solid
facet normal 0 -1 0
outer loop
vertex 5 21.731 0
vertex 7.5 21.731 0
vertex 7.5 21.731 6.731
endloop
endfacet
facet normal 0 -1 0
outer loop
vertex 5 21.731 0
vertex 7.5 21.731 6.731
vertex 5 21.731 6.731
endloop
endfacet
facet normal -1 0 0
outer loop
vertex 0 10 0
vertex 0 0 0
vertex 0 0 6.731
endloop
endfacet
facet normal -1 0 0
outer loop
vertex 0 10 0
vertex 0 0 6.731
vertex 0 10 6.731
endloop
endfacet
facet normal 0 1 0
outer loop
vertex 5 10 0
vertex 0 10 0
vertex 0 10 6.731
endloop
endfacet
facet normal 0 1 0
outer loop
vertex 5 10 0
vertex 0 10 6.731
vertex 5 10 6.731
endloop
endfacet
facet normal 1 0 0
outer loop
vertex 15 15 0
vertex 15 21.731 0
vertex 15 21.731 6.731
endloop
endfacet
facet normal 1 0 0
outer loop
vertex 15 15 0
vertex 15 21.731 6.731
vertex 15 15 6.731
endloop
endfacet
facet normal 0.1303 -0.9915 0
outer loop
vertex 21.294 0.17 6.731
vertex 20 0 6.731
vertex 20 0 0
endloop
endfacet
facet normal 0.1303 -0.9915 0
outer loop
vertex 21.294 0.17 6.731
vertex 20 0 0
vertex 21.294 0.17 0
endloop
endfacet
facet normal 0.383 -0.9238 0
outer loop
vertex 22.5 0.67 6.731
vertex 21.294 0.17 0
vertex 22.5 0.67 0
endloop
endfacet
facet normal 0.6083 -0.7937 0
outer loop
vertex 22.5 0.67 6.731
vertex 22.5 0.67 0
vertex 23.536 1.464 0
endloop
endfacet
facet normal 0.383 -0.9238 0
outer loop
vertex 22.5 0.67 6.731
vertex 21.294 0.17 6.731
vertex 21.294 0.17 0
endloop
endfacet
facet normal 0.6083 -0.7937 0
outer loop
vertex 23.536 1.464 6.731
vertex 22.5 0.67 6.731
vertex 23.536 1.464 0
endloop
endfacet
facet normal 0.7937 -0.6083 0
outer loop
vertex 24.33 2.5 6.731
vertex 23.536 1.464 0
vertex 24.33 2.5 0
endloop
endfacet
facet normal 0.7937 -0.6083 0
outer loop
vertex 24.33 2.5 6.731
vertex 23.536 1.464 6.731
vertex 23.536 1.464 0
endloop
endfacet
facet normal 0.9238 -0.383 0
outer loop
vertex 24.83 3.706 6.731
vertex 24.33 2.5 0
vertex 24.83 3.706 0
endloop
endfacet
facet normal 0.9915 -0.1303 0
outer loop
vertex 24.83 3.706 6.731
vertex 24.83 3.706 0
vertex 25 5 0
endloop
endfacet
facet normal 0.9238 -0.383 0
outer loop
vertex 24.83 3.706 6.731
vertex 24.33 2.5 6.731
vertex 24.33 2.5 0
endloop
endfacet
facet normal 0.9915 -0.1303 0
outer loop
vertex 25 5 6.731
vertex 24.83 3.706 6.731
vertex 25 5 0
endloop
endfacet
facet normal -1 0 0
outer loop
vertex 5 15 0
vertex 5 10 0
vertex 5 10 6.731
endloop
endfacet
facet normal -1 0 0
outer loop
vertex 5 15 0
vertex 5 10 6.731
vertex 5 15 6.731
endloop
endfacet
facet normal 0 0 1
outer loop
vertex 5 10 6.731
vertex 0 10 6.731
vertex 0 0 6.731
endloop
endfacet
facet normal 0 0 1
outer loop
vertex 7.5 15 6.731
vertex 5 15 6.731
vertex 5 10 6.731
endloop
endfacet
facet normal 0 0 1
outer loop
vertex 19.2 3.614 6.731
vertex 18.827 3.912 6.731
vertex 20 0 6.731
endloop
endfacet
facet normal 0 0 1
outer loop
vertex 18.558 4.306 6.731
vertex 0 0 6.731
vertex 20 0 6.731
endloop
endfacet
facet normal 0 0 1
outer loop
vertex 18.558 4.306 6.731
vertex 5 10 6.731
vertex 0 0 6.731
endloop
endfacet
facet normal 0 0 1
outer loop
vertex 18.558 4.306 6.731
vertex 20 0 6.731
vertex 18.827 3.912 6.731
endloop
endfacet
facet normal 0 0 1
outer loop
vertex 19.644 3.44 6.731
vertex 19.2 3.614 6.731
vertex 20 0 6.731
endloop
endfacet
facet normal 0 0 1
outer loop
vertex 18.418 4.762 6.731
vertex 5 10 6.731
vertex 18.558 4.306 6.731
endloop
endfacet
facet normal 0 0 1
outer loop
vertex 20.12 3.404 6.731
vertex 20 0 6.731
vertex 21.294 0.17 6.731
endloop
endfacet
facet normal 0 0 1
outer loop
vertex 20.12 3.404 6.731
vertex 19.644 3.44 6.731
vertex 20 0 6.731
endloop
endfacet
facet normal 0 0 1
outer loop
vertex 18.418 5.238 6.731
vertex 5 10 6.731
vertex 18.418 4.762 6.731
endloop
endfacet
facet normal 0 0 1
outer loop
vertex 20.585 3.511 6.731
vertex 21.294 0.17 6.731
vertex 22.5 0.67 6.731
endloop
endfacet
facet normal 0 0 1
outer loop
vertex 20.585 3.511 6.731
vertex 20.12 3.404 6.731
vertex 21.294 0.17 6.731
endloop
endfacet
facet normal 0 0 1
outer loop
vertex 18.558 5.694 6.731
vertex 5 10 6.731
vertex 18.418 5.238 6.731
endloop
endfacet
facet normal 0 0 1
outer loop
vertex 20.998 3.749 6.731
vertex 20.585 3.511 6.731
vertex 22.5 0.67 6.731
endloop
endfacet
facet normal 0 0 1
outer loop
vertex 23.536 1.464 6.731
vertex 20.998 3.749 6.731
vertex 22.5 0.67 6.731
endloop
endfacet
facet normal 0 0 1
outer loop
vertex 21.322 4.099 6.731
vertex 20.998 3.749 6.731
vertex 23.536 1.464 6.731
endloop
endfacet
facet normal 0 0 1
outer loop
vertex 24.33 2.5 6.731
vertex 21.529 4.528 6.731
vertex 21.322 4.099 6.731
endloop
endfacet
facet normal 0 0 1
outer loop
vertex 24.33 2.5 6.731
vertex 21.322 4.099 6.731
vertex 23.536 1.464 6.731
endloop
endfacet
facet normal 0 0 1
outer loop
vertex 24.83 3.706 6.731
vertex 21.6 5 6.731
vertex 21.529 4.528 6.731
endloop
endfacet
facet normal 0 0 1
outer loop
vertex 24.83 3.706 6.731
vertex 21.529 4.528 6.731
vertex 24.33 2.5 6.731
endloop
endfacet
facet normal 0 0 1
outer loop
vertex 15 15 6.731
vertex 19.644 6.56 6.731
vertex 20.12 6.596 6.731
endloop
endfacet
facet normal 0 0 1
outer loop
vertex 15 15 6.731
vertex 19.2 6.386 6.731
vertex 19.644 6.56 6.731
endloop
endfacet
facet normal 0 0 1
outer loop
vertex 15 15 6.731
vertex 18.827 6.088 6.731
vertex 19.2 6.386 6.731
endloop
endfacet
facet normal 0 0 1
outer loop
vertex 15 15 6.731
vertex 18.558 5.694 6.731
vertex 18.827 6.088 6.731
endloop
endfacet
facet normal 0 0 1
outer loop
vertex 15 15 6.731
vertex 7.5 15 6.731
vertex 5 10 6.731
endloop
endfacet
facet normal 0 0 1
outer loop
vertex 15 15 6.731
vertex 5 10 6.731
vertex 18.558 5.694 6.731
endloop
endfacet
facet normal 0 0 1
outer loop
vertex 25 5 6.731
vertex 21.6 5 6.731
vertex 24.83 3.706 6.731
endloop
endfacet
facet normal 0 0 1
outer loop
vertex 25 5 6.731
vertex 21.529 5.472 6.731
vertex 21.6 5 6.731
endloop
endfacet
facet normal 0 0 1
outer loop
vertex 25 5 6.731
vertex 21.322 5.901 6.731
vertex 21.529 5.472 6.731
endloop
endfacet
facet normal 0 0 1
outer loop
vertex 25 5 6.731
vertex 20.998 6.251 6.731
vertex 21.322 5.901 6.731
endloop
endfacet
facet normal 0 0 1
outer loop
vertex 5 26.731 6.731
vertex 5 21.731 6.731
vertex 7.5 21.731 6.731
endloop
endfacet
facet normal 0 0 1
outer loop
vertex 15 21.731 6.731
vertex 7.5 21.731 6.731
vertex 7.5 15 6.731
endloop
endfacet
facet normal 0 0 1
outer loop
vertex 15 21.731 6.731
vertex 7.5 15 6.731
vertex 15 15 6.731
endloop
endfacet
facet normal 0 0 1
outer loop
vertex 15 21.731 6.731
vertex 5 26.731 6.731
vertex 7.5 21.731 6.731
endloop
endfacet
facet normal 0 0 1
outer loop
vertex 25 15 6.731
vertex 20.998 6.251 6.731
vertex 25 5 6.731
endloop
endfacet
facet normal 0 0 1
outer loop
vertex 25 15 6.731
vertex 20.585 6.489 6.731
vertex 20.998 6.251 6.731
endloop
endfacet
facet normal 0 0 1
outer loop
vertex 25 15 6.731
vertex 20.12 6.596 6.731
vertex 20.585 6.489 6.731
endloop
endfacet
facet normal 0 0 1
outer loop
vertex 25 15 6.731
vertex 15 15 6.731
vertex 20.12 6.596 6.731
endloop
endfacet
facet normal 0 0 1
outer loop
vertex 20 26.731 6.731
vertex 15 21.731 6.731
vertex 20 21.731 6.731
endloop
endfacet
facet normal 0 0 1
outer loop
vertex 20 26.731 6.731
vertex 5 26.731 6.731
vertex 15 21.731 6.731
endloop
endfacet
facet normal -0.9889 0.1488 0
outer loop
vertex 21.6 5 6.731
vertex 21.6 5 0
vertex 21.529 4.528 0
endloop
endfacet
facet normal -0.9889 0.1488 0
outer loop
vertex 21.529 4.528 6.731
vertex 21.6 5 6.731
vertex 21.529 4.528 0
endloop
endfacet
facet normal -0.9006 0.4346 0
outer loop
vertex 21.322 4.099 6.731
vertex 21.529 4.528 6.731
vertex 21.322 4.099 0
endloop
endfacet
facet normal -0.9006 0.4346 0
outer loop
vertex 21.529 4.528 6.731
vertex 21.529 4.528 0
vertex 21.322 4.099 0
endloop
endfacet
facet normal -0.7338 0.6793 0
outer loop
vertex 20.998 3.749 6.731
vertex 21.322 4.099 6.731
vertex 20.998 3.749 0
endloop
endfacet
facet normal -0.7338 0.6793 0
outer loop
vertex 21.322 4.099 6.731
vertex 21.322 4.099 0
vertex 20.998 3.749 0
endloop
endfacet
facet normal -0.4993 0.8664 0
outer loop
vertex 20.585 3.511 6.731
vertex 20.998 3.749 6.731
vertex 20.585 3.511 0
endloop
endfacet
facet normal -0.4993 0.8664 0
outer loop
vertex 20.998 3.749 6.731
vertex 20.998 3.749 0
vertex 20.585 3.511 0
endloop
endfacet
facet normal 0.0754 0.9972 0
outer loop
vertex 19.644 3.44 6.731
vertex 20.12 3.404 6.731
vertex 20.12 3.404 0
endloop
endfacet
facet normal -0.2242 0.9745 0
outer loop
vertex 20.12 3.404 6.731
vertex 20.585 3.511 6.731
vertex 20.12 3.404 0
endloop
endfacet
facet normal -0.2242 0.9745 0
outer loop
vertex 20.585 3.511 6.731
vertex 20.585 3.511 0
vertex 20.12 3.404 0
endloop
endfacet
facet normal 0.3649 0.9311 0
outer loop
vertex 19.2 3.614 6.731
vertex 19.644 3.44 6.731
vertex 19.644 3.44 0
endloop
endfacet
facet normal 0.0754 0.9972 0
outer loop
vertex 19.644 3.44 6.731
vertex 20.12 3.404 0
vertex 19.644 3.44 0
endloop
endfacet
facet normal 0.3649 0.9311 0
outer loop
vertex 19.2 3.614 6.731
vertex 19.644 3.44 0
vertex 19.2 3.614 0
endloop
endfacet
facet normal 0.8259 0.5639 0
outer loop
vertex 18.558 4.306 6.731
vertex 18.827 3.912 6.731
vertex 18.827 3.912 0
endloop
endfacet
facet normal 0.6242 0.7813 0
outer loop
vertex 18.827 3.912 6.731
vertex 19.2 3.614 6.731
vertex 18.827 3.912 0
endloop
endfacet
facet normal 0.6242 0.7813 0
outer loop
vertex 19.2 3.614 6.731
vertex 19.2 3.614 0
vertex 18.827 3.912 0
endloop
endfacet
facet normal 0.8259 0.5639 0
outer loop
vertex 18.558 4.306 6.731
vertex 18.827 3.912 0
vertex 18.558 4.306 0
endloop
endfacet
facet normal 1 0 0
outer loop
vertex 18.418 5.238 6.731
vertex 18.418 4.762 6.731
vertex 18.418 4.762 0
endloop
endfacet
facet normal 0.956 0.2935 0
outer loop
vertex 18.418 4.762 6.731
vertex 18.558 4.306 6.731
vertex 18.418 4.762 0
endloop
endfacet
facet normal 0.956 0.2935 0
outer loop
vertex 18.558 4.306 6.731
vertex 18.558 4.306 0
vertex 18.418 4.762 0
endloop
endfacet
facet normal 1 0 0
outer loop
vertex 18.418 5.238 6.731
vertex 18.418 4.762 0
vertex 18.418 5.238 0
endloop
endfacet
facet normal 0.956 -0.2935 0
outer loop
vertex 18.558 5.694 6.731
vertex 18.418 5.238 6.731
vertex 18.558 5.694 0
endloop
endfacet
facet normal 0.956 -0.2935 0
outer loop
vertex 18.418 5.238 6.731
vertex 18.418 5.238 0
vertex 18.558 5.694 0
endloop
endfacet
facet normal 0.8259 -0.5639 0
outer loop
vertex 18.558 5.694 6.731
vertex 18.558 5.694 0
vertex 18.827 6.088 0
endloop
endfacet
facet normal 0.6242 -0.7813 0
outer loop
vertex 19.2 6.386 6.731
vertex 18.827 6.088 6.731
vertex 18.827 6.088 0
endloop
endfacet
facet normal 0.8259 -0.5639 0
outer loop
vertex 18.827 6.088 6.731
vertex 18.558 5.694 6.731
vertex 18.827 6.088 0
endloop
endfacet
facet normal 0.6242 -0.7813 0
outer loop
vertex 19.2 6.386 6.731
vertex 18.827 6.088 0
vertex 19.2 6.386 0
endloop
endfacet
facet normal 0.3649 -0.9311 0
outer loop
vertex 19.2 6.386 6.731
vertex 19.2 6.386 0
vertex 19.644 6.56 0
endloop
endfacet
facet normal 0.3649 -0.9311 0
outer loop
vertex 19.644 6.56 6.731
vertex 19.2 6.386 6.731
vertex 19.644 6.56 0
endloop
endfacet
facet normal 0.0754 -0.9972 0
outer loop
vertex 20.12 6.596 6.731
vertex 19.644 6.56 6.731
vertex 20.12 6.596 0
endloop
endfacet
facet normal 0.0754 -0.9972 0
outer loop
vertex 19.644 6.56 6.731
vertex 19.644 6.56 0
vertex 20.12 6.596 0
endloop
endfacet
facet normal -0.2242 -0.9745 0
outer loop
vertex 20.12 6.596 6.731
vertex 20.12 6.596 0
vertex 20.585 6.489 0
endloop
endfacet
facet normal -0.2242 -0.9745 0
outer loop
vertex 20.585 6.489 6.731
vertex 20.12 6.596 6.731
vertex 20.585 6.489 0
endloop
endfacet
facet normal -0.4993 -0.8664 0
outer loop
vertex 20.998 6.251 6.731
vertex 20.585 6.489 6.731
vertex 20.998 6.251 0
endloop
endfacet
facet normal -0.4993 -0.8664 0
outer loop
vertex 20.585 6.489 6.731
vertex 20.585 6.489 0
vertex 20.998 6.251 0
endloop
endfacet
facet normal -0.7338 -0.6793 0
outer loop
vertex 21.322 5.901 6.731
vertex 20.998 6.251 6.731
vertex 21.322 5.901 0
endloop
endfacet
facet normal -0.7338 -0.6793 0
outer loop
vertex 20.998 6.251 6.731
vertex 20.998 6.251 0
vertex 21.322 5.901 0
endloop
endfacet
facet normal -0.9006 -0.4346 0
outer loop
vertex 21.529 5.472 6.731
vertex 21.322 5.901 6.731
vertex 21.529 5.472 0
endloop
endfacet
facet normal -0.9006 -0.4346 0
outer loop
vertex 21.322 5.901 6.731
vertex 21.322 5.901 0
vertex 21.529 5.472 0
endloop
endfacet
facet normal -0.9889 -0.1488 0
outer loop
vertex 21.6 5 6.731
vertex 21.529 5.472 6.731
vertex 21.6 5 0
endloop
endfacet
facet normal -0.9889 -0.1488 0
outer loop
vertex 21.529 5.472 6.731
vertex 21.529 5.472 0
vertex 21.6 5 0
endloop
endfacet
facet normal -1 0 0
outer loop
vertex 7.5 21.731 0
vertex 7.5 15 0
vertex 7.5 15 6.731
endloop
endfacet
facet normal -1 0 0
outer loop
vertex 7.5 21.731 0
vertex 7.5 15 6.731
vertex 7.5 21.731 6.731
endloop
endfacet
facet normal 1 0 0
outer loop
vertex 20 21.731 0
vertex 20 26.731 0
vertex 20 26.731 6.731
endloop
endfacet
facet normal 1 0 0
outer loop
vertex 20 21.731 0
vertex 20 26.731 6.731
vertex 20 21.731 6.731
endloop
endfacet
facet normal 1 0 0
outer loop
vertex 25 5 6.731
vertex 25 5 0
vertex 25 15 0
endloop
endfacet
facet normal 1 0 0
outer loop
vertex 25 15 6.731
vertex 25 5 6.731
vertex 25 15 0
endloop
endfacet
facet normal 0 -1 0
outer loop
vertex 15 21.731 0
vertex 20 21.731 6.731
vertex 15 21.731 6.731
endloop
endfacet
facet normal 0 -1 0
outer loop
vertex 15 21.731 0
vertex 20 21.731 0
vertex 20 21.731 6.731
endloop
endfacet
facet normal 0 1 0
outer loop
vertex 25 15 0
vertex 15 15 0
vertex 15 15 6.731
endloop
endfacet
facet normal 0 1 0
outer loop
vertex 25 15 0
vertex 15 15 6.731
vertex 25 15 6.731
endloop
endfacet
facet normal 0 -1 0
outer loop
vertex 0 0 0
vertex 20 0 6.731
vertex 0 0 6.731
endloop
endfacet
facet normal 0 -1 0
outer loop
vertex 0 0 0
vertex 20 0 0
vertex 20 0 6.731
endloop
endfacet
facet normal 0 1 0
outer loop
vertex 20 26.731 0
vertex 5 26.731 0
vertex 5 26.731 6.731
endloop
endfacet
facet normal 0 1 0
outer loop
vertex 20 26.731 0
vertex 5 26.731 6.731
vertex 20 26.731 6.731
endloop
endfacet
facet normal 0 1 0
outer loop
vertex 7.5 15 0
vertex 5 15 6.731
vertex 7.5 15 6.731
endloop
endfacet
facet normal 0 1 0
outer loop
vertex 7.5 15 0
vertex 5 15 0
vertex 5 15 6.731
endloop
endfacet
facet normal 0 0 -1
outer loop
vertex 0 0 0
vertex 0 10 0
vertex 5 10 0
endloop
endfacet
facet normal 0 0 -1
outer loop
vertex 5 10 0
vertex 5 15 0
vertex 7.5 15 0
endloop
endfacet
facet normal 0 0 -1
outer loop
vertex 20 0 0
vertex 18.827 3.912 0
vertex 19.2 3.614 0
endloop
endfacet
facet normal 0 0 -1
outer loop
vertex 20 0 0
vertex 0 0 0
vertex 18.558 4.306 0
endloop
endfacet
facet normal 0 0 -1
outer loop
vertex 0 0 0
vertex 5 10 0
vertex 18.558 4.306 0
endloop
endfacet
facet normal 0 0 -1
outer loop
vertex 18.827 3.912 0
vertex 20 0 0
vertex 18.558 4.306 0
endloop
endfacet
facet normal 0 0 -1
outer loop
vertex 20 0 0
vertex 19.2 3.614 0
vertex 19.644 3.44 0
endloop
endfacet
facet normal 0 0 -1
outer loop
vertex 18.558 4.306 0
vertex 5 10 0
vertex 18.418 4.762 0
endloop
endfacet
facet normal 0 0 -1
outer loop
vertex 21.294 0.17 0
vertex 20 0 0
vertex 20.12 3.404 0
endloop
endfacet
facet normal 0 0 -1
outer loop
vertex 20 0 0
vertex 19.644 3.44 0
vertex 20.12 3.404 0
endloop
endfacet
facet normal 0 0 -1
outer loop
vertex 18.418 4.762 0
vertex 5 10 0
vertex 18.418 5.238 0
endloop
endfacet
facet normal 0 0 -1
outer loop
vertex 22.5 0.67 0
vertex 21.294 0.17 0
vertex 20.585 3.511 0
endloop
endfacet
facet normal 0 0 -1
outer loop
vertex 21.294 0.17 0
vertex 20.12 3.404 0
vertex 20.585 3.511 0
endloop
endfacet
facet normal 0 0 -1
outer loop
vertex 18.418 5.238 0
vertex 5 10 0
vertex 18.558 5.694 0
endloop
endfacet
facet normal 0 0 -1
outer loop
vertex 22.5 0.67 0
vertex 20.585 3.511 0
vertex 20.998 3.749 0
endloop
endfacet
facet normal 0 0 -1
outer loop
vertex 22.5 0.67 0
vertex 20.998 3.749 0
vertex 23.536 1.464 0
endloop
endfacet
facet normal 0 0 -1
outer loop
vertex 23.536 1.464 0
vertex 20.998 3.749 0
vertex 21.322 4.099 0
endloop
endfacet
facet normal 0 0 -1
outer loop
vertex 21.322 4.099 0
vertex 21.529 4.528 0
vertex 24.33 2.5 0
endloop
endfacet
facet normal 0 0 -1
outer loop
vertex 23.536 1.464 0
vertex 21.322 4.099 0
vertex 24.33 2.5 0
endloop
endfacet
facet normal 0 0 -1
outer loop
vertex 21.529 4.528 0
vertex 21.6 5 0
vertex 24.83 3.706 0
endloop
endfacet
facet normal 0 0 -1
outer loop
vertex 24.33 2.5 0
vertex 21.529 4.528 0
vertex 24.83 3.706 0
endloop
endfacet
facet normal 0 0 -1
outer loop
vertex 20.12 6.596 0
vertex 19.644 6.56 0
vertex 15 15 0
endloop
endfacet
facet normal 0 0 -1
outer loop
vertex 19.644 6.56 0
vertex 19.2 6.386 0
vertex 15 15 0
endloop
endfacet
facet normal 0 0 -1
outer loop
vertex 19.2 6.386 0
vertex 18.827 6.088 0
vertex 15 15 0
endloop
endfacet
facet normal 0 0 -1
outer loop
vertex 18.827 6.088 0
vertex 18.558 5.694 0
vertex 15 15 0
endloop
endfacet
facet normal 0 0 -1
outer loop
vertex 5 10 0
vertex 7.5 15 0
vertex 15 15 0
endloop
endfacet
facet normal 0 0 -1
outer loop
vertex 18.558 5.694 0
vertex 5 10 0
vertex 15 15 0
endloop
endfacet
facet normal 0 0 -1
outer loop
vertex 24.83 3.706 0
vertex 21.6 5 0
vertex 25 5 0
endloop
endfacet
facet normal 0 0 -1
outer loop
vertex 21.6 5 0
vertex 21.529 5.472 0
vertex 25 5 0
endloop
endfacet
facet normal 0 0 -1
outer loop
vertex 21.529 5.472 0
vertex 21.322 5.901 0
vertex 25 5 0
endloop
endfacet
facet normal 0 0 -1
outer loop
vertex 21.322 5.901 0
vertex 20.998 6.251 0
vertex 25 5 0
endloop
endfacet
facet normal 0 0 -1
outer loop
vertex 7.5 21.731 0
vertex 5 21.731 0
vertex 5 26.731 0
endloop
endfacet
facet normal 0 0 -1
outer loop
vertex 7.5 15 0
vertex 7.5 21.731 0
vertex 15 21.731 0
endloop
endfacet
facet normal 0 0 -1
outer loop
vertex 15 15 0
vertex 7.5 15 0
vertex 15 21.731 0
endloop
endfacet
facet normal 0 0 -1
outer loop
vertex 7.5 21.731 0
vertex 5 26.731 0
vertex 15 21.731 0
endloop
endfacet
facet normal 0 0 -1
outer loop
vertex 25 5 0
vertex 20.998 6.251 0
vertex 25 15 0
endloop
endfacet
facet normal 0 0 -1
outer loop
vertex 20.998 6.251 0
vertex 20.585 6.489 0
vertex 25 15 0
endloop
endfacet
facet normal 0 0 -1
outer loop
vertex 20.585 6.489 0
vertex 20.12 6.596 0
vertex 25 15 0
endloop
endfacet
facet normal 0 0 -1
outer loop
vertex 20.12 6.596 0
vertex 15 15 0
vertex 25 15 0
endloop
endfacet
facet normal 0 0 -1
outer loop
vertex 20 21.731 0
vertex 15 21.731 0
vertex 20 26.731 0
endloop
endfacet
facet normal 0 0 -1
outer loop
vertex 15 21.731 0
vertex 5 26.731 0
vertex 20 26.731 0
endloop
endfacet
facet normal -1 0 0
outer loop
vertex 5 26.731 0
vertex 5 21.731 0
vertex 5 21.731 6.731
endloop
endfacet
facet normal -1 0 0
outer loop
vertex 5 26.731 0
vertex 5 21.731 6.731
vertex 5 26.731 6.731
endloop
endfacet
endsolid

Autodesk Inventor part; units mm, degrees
ref_plane "YZ Plane" through (0, 0, 0) normal (1, 0, 0) x (0, 1, 0)
ref_plane "XZ Plane" through (0, 0, 0) normal (0, 1, 0) x (-1, 0, 0)
ref_plane "XY Plane" through (0, 0, 0) normal (0, 0, 1) x (1, 0, 0)
sketch "Sketch1" plane through (0, 0, 0) normal (0, 0, 1) x (1, 0, 0)
  line L0 (25, 0) -> (0, 0)
  line L1 (0, 0) -> (0, 10)
  line L2 (0, 10) -> (5, 10)
  line L3 (25, 0) -> (25, 15)
  circle A0 centre (20, 5) radius 1.6
  line L4 (5, 10) -> (5, 15)
  line L5 (7.5, 15) -> (7.5, 21.731)
  line L6 (7.5, 21.731) -> (5, 21.731)
  line L7 (5, 21.731) -> (5, 26.731)
  line L8 (5, 26.731) -> (20, 26.731)
  line L9 (20, 26.731) -> (20, 21.731)
  line L10 (20, 21.731) -> (15, 21.731)
  line L11 (15, 21.731) -> (15, 15)
  line L12 (5, 15) -> (7.5, 15)
  line L13 (15, 15) -> (25, 15)
  dimension "d0" = 10
  dimension "d8" = 5
  dimension "d9" = 25
  dimension "d12" = 5
  dimension "d13" = 5
  dimension "d20" = 3.2
  dimension "d22" = 7.5
  dimension "d23" = 2.5
  dimension "d24" = 15
  dimension "d25" = 5
  dimension "d26" = 6.731
  dimension "d27" = 15
extrude "Extrusion1" add sketch "Sketch1" along normal blind 6.731
fillet "Fillet1" radius 5 1 edges at (25, 0, 3.3655)
equation "\"d8\" = d3"
equation "\"d12\" = d13"
equation "\"d26\" = THICKB"
equation "\"d15\" = THICKB"
equation "\"THICKA\" = 3.175"
equation "\"THICKB\" = 6.731"
equation "\"THICKC\" = 12.7"
equation "\"MAGDIA\" = 9.5"
equation "\"BALLDIA\" = 12"
equation "\"d3\" = 5"
properties part number "Carriage_Belt_Lock"
